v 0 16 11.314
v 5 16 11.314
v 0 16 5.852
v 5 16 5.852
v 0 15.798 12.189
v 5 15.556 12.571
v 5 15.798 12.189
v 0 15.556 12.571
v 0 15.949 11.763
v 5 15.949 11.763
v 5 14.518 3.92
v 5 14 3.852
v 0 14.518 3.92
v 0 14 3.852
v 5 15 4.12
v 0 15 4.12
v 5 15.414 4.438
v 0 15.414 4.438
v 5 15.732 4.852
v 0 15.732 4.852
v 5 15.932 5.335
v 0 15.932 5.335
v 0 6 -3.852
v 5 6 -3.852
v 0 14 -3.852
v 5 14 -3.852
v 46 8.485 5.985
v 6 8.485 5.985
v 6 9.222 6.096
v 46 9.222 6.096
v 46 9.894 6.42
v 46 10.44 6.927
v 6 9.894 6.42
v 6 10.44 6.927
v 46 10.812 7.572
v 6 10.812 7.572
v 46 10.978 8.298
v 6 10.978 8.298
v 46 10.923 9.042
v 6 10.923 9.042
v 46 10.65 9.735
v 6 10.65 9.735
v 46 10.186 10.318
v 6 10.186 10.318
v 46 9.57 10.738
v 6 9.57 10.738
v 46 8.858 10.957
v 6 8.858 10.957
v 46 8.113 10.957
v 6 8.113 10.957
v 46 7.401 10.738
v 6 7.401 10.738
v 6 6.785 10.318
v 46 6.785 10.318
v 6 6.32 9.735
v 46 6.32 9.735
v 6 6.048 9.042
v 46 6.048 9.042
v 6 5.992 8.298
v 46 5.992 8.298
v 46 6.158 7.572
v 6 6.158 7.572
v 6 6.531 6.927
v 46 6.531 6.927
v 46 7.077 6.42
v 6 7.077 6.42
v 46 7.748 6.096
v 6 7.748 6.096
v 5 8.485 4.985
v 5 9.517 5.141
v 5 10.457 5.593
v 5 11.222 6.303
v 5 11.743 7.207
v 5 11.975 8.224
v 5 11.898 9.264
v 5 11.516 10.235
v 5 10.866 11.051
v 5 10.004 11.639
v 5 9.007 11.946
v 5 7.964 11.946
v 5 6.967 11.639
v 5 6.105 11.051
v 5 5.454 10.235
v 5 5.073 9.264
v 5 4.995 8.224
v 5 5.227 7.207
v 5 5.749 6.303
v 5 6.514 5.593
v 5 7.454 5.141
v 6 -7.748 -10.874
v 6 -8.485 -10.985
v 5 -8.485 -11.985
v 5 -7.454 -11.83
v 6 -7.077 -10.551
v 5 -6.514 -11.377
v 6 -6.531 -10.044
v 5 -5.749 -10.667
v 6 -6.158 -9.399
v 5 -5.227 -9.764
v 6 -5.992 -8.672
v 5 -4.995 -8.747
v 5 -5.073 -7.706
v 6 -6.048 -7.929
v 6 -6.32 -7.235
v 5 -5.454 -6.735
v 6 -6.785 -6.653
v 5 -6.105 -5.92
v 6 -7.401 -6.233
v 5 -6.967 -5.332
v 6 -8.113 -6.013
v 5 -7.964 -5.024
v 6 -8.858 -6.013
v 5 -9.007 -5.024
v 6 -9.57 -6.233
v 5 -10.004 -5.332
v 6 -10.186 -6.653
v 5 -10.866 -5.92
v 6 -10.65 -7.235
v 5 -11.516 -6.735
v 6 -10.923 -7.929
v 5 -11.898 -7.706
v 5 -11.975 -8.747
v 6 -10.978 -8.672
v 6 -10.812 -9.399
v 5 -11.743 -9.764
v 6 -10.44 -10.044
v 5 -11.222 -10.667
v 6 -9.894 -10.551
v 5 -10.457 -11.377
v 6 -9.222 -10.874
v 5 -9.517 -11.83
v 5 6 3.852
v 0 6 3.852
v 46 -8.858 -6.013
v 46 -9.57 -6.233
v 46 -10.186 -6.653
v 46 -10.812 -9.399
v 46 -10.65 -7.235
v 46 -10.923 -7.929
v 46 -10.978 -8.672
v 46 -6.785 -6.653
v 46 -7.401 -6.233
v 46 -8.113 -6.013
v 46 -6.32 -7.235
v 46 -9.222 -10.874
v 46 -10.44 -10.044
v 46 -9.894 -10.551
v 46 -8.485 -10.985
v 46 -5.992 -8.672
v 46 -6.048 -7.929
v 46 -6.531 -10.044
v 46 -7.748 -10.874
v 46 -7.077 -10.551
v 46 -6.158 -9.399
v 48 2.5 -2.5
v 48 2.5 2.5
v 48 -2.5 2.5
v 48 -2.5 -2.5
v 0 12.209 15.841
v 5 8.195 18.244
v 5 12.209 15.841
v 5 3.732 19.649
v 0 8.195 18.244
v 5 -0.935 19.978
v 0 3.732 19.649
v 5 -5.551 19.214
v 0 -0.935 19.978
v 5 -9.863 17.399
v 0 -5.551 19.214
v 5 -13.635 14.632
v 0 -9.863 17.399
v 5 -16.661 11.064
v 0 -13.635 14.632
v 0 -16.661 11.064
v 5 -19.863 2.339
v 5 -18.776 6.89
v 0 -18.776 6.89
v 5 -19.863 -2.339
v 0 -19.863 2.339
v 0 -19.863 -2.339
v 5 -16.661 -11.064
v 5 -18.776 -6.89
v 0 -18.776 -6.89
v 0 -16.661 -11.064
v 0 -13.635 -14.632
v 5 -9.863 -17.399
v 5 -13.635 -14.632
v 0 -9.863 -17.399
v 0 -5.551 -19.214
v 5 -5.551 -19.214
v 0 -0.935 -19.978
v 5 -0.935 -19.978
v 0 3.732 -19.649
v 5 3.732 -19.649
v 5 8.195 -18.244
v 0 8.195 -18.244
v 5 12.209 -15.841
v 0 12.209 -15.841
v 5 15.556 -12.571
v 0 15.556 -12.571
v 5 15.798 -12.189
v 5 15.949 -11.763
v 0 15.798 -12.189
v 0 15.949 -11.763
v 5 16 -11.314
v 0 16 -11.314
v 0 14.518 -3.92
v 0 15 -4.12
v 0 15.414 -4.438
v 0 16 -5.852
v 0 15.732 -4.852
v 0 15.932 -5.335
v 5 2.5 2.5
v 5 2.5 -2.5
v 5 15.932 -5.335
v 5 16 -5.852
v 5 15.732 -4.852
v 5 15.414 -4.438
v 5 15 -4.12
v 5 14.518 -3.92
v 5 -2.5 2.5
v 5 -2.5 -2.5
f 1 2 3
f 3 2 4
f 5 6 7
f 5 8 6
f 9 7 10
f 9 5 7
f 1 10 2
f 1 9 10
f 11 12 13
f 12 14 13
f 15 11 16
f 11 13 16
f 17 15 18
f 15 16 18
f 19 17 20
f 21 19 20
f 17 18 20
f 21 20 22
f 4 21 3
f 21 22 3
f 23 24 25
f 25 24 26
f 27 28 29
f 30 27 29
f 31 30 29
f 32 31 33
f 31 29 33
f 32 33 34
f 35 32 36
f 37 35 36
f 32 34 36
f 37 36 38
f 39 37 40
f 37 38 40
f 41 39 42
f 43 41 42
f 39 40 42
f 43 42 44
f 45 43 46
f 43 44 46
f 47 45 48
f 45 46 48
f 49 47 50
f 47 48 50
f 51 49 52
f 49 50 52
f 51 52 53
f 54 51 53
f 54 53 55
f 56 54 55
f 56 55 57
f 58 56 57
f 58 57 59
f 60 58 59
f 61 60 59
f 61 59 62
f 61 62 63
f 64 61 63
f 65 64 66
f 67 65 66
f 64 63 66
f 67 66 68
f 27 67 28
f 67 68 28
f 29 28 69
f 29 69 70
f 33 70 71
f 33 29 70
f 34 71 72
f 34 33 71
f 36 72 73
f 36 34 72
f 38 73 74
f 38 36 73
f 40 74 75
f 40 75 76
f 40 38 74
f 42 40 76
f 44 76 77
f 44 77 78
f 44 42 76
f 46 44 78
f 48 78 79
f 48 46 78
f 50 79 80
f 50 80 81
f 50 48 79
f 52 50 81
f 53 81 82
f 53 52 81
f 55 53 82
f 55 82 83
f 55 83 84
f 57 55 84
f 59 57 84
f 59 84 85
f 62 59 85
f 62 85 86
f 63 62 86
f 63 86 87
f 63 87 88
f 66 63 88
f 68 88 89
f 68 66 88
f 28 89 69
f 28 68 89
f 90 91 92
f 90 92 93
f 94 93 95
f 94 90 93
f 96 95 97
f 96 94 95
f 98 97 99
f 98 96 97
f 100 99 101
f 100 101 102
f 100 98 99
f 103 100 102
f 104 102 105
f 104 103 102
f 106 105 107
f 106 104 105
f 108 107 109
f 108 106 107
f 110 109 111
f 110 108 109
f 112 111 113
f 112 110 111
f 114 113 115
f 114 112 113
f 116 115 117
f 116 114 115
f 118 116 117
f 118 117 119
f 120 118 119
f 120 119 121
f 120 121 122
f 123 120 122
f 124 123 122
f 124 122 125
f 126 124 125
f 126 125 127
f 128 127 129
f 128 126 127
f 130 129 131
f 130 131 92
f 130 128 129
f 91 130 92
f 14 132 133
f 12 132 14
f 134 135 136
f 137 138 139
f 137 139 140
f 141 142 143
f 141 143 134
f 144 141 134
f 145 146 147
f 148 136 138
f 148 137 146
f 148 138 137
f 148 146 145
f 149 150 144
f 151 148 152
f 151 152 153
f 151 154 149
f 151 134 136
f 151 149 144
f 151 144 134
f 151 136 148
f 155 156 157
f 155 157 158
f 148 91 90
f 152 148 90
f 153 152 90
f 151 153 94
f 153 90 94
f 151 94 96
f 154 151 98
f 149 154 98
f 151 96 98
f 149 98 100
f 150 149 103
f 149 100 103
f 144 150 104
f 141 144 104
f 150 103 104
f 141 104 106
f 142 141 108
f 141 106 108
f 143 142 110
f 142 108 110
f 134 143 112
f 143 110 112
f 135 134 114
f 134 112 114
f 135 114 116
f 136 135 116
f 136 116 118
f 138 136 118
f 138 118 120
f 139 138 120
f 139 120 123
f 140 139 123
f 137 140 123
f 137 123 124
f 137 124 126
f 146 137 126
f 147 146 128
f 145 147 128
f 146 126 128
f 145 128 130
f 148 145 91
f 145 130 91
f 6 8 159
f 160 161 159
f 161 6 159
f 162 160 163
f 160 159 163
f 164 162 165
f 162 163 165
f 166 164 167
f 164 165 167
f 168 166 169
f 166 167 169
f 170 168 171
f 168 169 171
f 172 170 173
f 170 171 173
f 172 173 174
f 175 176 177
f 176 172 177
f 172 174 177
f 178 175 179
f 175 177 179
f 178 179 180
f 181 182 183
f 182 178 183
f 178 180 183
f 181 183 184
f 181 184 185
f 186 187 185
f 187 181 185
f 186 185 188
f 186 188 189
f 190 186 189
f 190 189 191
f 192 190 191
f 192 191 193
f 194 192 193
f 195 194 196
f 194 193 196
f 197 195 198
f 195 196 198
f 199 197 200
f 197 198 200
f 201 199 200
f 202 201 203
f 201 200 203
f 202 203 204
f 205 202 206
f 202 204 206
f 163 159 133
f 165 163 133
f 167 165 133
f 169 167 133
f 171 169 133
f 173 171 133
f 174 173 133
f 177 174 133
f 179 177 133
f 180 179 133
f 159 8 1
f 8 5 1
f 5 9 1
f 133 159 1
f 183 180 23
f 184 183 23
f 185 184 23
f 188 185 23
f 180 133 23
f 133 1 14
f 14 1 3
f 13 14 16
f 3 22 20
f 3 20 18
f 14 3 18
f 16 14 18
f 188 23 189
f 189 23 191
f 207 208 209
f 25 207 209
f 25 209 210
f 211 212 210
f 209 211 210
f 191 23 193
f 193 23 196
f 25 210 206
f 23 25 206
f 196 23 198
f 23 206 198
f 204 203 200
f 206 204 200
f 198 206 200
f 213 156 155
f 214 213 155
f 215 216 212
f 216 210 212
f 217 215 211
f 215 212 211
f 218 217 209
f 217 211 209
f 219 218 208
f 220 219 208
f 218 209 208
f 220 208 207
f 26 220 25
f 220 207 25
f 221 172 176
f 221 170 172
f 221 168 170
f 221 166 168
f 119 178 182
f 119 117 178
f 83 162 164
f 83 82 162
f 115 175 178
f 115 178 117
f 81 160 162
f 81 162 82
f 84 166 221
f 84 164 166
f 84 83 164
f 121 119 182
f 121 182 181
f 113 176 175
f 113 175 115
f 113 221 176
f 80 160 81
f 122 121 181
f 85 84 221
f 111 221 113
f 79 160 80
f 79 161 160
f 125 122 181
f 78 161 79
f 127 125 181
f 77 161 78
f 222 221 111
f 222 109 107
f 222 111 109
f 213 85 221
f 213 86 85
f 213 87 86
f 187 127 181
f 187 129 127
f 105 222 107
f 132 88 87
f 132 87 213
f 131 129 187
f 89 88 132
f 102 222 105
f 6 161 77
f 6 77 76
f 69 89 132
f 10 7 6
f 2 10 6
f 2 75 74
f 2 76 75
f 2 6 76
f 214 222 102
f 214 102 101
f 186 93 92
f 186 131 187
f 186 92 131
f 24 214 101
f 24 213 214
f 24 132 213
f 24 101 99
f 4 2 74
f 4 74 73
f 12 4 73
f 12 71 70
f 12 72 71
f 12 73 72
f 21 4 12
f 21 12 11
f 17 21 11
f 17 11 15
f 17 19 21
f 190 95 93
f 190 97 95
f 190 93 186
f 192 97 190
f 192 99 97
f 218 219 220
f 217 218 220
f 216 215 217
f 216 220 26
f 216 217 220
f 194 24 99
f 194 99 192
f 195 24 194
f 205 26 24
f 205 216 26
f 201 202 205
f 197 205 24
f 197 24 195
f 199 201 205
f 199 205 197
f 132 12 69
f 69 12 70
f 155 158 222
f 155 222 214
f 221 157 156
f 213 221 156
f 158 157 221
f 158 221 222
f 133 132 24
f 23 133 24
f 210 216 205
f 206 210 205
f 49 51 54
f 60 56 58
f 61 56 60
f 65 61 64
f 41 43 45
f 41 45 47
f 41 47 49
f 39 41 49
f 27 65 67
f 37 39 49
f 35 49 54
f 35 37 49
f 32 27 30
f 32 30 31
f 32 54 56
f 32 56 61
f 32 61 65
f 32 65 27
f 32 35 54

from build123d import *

# Parameters (mm, degrees)
SKETCH2_R           = 20
BOSS_EXTRUDE2_DEPTH = 5
SKETCH3_W           = 5
SKETCH3_H           = 5
BOSS_EXTRUDE3_DEPTH = 43
SKETCH4_R           = 2.5
BOSS_EXTRUDE4_DEPTH = 41
SKETCH5_W           = 7.704684196
SKETCH5_H           = 10
CUT_EXTRUDE1_DEPTH  = 6
FILLET1_R           = 2
CHAMFER1_SIZE       = 1


with BuildPart() as part:
    # Sketch2 → Boss-Extrude2 (new body)
    with BuildSketch(Plane(origin=(0, 0, 0), x_dir=(0, 0, -1), z_dir=(1, 0, 0))):
        Circle(SKETCH2_R)
    extrude(amount=BOSS_EXTRUDE2_DEPTH)

    # Sketch3 → Boss-Extrude3 (add)
    with BuildSketch(Plane(origin=(5, 0, 0), x_dir=(0, 0, -1), z_dir=(1, 0, 0))):
        Rectangle(SKETCH3_W, SKETCH3_H)
    extrude(amount=BOSS_EXTRUDE3_DEPTH)

    # Sketch4 → Boss-Extrude4 (add)
    with BuildSketch(Plane(origin=(5, 0, 0), x_dir=(0, 0, -1), z_dir=(1, 0, 0))):
        with Locations((-8.485281374, 8.485281374)):
            Circle(SKETCH4_R)
        with Locations((8.485281374, -8.485281374)):
            Circle(SKETCH4_R)
    extrude(amount=BOSS_EXTRUDE4_DEPTH)

    # Sketch5 → Cut-Extrude1 (cut, through all)
    with BuildSketch(Plane(origin=(5, 0, 0), x_dir=(0, 0, -1), z_dir=(1, 0, 0))):
        with BuildLine():
            Line((-12, 16), (-3.852342098, 16))
            Line((-3.852342098, 16), (-3.852342098, 19.625479876))
            ThreePointArc((-3.852342098, 19.625479876), (-8.130818752, 18.272651324), (-12, 16))
        make_face()
        with BuildLine():
            Line((-3.852342098, 19.625479876), (-3.852342098, 16))
            Line((-3.852342098, 16), (3.852342098, 16))
            Line((3.852342098, 16), (3.852342098, 19.625479876))
            ThreePointArc((3.852342098, 19.625479876), (1.935252254, 19.906149771), (2.3e-08, 20))
            ThreePointArc((2.3e-08, 20), (-1.935252231, 19.906149773), (-3.852342098, 19.625479876))
        make_face()
        with BuildLine():
            Line((3.852342098, 19.625479876), (3.852342098, 16))
            Line((3.852342098, 16), (12, 16))
            ThreePointArc((12, 16), (8.130818752, 18.272651324), (3.852342098, 19.625479876))
        make_face()
        with Locations((0, 11)):
            Rectangle(SKETCH5_W, SKETCH5_H)
    extrude(amount=-CUT_EXTRUDE1_DEPTH, mode=Mode.SUBTRACT)

    # Fillet1
    fillet1_edges = [part.edges().sort_by_distance(p)[0] for p in [
        (2.5, 16, 12),
        (2.5, 16, -12),
        (2.5, 16, -3.852342098),
        (2.5, 16, 3.852342098),
    ]]
    fillet(fillet1_edges, radius=FILLET1_R)

    # Chamfer1
    chamfer1_edges = [part.edges().sort_by_distance(p)[0] for p in [
        (5, 8.485281374, 10.985281374),
        (5, -8.485281374, -5.985281374),
    ]]
    chamfer(chamfer1_edges, length=CHAMFER1_SIZE)


solid = part.part
